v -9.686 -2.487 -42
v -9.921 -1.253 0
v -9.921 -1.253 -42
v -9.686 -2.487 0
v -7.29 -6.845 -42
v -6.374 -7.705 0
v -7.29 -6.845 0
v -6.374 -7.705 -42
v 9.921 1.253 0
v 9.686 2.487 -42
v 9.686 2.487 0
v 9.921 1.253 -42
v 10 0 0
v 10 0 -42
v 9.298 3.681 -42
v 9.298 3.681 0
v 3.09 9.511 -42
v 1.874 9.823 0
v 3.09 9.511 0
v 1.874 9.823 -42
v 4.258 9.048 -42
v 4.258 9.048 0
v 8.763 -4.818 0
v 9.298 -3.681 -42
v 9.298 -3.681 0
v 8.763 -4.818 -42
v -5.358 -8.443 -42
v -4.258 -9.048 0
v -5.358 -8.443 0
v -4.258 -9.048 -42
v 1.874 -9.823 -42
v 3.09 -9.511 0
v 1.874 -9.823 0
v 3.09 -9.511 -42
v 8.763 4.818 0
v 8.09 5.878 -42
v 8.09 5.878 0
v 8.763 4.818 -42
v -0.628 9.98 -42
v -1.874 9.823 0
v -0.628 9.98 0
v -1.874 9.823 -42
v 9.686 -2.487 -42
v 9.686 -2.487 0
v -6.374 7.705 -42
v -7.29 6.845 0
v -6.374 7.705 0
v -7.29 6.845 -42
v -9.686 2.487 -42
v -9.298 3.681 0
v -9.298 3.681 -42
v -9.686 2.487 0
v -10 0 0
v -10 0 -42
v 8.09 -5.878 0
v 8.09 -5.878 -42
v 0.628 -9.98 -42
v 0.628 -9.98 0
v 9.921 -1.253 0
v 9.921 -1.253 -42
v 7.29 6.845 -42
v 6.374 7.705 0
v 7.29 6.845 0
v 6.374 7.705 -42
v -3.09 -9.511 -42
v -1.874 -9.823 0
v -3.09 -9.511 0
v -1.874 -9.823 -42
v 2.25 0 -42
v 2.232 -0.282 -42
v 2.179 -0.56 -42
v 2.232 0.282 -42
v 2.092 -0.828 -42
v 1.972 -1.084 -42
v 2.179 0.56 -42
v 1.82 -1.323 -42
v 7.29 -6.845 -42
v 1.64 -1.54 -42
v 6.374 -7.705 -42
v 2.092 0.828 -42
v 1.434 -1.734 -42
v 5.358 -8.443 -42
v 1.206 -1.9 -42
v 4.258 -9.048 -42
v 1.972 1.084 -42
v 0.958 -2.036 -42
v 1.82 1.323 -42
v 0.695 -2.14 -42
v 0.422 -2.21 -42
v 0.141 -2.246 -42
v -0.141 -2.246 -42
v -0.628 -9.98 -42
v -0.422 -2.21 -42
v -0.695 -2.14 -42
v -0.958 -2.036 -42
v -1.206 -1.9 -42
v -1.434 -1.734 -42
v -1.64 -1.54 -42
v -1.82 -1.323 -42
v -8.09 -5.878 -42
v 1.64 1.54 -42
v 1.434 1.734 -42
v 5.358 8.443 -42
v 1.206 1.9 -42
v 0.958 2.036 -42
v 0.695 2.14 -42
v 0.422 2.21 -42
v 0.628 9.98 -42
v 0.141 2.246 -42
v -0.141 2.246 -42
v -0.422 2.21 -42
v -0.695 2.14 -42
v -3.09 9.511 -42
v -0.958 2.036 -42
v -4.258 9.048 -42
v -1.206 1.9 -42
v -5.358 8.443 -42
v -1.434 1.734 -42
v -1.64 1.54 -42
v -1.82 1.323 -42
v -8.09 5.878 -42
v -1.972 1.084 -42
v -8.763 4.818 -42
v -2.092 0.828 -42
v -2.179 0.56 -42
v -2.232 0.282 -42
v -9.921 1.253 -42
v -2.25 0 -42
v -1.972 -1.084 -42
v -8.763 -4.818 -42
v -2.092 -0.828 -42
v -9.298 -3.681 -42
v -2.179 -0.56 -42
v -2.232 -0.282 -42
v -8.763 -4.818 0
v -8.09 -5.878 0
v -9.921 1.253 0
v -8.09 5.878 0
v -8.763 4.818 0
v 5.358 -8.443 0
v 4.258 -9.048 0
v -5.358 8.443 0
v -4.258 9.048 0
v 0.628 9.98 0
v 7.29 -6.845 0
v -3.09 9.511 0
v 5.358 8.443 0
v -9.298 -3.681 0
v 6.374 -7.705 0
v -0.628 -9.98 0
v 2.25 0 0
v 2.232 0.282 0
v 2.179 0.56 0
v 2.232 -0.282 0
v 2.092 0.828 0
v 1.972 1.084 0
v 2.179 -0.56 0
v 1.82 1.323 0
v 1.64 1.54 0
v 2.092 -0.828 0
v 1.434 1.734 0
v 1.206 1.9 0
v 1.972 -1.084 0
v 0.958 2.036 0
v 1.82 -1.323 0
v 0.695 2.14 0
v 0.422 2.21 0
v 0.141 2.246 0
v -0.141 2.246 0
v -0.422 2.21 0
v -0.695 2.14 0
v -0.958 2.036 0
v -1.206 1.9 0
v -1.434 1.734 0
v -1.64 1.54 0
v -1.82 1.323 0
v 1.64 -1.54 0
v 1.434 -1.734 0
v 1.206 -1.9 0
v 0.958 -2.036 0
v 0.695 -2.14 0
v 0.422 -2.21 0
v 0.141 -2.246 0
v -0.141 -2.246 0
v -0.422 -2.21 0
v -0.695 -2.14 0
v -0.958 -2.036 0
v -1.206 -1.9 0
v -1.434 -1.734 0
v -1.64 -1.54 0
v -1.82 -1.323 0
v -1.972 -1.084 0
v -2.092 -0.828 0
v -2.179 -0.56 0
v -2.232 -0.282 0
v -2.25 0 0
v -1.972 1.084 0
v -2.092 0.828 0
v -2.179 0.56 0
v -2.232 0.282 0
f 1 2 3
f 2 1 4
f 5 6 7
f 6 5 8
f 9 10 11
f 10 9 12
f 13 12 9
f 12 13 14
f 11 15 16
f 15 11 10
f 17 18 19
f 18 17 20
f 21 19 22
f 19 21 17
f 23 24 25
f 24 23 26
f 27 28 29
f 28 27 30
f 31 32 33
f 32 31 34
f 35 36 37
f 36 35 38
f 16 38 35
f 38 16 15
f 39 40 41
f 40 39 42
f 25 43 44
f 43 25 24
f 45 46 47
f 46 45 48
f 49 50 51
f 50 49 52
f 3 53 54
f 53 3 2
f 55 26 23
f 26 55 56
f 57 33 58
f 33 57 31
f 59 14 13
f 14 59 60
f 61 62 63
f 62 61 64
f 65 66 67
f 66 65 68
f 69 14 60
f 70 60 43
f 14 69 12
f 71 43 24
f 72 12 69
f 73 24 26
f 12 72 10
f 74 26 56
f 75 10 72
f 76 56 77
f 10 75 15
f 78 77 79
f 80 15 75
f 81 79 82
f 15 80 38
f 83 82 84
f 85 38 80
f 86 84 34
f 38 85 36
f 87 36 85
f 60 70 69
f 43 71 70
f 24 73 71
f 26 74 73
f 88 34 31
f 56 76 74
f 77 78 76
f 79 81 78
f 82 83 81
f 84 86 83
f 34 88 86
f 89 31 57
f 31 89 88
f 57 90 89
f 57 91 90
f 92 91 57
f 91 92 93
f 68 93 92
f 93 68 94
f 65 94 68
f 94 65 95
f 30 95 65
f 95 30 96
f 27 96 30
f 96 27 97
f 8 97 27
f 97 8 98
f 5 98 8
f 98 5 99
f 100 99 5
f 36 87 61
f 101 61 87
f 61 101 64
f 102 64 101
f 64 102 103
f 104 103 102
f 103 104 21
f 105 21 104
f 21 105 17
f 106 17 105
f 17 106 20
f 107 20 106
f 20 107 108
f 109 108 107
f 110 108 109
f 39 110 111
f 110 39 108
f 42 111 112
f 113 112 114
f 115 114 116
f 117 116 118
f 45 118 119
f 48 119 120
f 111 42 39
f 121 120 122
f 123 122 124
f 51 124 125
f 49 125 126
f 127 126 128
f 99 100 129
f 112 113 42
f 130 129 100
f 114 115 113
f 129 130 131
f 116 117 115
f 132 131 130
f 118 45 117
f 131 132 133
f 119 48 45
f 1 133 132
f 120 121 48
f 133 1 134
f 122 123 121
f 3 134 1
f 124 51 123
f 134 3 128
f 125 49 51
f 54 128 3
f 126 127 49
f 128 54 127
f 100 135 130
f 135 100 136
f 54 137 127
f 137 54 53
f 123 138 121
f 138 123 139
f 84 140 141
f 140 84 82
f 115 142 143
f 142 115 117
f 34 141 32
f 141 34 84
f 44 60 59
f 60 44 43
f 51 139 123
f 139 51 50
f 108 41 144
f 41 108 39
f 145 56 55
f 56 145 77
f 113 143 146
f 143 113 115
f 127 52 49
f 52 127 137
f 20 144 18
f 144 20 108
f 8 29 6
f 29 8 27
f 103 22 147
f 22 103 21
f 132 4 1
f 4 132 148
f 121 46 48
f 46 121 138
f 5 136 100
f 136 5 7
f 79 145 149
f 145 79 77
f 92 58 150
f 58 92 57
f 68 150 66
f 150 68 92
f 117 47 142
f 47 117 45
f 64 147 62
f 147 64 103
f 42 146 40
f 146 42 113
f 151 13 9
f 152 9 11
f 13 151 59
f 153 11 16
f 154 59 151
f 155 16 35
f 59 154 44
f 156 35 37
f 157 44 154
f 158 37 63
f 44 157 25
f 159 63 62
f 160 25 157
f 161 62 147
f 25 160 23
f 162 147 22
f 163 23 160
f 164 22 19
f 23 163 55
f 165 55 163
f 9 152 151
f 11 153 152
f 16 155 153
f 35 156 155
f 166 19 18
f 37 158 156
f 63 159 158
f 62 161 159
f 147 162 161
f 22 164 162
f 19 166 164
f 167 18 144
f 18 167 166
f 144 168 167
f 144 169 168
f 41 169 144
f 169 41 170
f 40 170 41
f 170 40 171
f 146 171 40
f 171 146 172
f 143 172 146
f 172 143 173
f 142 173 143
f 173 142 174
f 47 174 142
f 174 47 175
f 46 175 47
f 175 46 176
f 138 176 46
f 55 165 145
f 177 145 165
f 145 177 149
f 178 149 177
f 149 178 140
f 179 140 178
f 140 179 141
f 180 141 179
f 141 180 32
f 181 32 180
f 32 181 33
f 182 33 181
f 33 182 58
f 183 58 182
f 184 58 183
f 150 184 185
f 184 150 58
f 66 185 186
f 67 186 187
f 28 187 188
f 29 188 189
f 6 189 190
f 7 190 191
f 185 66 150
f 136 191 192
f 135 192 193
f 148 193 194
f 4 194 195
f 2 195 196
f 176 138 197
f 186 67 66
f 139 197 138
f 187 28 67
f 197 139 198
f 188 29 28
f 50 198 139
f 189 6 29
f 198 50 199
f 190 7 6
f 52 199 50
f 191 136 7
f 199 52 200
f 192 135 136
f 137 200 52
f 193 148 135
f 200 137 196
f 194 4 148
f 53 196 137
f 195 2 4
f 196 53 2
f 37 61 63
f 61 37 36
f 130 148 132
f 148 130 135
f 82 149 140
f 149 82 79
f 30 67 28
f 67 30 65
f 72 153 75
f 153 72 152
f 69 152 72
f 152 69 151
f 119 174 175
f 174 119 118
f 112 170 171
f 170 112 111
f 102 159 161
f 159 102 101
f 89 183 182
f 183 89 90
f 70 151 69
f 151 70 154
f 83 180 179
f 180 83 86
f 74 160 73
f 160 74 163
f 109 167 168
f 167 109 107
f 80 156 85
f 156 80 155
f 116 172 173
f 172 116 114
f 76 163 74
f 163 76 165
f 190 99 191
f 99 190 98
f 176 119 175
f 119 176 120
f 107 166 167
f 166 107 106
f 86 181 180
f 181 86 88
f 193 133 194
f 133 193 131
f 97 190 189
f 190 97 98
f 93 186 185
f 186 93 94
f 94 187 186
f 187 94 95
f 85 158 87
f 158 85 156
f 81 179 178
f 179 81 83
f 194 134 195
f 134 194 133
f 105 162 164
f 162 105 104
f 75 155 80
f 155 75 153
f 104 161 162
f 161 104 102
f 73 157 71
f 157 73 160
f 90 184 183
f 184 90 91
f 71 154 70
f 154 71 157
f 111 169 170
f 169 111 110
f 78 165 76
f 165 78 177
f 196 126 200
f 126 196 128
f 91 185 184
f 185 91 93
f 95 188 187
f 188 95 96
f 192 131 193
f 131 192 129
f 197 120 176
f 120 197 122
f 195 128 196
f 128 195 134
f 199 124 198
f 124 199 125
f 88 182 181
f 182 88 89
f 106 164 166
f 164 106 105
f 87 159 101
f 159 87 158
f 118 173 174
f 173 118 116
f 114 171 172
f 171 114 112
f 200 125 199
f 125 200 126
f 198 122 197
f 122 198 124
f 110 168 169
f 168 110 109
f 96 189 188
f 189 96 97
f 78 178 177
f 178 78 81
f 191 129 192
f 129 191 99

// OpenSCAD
$fn = 50;


difference() {
	union() {
		translate(v = [0, 0, -42.0000000000]) {
			cylinder(h = 42, r = 10.0000000000);
		}
		cylinder(h = 0, r = 13.0000000000);
	}
	union() {
		#translate(v = [0, 0, -42]) {
			cylinder(h = 42, r = 2.2500000000);
		}
	}
}
